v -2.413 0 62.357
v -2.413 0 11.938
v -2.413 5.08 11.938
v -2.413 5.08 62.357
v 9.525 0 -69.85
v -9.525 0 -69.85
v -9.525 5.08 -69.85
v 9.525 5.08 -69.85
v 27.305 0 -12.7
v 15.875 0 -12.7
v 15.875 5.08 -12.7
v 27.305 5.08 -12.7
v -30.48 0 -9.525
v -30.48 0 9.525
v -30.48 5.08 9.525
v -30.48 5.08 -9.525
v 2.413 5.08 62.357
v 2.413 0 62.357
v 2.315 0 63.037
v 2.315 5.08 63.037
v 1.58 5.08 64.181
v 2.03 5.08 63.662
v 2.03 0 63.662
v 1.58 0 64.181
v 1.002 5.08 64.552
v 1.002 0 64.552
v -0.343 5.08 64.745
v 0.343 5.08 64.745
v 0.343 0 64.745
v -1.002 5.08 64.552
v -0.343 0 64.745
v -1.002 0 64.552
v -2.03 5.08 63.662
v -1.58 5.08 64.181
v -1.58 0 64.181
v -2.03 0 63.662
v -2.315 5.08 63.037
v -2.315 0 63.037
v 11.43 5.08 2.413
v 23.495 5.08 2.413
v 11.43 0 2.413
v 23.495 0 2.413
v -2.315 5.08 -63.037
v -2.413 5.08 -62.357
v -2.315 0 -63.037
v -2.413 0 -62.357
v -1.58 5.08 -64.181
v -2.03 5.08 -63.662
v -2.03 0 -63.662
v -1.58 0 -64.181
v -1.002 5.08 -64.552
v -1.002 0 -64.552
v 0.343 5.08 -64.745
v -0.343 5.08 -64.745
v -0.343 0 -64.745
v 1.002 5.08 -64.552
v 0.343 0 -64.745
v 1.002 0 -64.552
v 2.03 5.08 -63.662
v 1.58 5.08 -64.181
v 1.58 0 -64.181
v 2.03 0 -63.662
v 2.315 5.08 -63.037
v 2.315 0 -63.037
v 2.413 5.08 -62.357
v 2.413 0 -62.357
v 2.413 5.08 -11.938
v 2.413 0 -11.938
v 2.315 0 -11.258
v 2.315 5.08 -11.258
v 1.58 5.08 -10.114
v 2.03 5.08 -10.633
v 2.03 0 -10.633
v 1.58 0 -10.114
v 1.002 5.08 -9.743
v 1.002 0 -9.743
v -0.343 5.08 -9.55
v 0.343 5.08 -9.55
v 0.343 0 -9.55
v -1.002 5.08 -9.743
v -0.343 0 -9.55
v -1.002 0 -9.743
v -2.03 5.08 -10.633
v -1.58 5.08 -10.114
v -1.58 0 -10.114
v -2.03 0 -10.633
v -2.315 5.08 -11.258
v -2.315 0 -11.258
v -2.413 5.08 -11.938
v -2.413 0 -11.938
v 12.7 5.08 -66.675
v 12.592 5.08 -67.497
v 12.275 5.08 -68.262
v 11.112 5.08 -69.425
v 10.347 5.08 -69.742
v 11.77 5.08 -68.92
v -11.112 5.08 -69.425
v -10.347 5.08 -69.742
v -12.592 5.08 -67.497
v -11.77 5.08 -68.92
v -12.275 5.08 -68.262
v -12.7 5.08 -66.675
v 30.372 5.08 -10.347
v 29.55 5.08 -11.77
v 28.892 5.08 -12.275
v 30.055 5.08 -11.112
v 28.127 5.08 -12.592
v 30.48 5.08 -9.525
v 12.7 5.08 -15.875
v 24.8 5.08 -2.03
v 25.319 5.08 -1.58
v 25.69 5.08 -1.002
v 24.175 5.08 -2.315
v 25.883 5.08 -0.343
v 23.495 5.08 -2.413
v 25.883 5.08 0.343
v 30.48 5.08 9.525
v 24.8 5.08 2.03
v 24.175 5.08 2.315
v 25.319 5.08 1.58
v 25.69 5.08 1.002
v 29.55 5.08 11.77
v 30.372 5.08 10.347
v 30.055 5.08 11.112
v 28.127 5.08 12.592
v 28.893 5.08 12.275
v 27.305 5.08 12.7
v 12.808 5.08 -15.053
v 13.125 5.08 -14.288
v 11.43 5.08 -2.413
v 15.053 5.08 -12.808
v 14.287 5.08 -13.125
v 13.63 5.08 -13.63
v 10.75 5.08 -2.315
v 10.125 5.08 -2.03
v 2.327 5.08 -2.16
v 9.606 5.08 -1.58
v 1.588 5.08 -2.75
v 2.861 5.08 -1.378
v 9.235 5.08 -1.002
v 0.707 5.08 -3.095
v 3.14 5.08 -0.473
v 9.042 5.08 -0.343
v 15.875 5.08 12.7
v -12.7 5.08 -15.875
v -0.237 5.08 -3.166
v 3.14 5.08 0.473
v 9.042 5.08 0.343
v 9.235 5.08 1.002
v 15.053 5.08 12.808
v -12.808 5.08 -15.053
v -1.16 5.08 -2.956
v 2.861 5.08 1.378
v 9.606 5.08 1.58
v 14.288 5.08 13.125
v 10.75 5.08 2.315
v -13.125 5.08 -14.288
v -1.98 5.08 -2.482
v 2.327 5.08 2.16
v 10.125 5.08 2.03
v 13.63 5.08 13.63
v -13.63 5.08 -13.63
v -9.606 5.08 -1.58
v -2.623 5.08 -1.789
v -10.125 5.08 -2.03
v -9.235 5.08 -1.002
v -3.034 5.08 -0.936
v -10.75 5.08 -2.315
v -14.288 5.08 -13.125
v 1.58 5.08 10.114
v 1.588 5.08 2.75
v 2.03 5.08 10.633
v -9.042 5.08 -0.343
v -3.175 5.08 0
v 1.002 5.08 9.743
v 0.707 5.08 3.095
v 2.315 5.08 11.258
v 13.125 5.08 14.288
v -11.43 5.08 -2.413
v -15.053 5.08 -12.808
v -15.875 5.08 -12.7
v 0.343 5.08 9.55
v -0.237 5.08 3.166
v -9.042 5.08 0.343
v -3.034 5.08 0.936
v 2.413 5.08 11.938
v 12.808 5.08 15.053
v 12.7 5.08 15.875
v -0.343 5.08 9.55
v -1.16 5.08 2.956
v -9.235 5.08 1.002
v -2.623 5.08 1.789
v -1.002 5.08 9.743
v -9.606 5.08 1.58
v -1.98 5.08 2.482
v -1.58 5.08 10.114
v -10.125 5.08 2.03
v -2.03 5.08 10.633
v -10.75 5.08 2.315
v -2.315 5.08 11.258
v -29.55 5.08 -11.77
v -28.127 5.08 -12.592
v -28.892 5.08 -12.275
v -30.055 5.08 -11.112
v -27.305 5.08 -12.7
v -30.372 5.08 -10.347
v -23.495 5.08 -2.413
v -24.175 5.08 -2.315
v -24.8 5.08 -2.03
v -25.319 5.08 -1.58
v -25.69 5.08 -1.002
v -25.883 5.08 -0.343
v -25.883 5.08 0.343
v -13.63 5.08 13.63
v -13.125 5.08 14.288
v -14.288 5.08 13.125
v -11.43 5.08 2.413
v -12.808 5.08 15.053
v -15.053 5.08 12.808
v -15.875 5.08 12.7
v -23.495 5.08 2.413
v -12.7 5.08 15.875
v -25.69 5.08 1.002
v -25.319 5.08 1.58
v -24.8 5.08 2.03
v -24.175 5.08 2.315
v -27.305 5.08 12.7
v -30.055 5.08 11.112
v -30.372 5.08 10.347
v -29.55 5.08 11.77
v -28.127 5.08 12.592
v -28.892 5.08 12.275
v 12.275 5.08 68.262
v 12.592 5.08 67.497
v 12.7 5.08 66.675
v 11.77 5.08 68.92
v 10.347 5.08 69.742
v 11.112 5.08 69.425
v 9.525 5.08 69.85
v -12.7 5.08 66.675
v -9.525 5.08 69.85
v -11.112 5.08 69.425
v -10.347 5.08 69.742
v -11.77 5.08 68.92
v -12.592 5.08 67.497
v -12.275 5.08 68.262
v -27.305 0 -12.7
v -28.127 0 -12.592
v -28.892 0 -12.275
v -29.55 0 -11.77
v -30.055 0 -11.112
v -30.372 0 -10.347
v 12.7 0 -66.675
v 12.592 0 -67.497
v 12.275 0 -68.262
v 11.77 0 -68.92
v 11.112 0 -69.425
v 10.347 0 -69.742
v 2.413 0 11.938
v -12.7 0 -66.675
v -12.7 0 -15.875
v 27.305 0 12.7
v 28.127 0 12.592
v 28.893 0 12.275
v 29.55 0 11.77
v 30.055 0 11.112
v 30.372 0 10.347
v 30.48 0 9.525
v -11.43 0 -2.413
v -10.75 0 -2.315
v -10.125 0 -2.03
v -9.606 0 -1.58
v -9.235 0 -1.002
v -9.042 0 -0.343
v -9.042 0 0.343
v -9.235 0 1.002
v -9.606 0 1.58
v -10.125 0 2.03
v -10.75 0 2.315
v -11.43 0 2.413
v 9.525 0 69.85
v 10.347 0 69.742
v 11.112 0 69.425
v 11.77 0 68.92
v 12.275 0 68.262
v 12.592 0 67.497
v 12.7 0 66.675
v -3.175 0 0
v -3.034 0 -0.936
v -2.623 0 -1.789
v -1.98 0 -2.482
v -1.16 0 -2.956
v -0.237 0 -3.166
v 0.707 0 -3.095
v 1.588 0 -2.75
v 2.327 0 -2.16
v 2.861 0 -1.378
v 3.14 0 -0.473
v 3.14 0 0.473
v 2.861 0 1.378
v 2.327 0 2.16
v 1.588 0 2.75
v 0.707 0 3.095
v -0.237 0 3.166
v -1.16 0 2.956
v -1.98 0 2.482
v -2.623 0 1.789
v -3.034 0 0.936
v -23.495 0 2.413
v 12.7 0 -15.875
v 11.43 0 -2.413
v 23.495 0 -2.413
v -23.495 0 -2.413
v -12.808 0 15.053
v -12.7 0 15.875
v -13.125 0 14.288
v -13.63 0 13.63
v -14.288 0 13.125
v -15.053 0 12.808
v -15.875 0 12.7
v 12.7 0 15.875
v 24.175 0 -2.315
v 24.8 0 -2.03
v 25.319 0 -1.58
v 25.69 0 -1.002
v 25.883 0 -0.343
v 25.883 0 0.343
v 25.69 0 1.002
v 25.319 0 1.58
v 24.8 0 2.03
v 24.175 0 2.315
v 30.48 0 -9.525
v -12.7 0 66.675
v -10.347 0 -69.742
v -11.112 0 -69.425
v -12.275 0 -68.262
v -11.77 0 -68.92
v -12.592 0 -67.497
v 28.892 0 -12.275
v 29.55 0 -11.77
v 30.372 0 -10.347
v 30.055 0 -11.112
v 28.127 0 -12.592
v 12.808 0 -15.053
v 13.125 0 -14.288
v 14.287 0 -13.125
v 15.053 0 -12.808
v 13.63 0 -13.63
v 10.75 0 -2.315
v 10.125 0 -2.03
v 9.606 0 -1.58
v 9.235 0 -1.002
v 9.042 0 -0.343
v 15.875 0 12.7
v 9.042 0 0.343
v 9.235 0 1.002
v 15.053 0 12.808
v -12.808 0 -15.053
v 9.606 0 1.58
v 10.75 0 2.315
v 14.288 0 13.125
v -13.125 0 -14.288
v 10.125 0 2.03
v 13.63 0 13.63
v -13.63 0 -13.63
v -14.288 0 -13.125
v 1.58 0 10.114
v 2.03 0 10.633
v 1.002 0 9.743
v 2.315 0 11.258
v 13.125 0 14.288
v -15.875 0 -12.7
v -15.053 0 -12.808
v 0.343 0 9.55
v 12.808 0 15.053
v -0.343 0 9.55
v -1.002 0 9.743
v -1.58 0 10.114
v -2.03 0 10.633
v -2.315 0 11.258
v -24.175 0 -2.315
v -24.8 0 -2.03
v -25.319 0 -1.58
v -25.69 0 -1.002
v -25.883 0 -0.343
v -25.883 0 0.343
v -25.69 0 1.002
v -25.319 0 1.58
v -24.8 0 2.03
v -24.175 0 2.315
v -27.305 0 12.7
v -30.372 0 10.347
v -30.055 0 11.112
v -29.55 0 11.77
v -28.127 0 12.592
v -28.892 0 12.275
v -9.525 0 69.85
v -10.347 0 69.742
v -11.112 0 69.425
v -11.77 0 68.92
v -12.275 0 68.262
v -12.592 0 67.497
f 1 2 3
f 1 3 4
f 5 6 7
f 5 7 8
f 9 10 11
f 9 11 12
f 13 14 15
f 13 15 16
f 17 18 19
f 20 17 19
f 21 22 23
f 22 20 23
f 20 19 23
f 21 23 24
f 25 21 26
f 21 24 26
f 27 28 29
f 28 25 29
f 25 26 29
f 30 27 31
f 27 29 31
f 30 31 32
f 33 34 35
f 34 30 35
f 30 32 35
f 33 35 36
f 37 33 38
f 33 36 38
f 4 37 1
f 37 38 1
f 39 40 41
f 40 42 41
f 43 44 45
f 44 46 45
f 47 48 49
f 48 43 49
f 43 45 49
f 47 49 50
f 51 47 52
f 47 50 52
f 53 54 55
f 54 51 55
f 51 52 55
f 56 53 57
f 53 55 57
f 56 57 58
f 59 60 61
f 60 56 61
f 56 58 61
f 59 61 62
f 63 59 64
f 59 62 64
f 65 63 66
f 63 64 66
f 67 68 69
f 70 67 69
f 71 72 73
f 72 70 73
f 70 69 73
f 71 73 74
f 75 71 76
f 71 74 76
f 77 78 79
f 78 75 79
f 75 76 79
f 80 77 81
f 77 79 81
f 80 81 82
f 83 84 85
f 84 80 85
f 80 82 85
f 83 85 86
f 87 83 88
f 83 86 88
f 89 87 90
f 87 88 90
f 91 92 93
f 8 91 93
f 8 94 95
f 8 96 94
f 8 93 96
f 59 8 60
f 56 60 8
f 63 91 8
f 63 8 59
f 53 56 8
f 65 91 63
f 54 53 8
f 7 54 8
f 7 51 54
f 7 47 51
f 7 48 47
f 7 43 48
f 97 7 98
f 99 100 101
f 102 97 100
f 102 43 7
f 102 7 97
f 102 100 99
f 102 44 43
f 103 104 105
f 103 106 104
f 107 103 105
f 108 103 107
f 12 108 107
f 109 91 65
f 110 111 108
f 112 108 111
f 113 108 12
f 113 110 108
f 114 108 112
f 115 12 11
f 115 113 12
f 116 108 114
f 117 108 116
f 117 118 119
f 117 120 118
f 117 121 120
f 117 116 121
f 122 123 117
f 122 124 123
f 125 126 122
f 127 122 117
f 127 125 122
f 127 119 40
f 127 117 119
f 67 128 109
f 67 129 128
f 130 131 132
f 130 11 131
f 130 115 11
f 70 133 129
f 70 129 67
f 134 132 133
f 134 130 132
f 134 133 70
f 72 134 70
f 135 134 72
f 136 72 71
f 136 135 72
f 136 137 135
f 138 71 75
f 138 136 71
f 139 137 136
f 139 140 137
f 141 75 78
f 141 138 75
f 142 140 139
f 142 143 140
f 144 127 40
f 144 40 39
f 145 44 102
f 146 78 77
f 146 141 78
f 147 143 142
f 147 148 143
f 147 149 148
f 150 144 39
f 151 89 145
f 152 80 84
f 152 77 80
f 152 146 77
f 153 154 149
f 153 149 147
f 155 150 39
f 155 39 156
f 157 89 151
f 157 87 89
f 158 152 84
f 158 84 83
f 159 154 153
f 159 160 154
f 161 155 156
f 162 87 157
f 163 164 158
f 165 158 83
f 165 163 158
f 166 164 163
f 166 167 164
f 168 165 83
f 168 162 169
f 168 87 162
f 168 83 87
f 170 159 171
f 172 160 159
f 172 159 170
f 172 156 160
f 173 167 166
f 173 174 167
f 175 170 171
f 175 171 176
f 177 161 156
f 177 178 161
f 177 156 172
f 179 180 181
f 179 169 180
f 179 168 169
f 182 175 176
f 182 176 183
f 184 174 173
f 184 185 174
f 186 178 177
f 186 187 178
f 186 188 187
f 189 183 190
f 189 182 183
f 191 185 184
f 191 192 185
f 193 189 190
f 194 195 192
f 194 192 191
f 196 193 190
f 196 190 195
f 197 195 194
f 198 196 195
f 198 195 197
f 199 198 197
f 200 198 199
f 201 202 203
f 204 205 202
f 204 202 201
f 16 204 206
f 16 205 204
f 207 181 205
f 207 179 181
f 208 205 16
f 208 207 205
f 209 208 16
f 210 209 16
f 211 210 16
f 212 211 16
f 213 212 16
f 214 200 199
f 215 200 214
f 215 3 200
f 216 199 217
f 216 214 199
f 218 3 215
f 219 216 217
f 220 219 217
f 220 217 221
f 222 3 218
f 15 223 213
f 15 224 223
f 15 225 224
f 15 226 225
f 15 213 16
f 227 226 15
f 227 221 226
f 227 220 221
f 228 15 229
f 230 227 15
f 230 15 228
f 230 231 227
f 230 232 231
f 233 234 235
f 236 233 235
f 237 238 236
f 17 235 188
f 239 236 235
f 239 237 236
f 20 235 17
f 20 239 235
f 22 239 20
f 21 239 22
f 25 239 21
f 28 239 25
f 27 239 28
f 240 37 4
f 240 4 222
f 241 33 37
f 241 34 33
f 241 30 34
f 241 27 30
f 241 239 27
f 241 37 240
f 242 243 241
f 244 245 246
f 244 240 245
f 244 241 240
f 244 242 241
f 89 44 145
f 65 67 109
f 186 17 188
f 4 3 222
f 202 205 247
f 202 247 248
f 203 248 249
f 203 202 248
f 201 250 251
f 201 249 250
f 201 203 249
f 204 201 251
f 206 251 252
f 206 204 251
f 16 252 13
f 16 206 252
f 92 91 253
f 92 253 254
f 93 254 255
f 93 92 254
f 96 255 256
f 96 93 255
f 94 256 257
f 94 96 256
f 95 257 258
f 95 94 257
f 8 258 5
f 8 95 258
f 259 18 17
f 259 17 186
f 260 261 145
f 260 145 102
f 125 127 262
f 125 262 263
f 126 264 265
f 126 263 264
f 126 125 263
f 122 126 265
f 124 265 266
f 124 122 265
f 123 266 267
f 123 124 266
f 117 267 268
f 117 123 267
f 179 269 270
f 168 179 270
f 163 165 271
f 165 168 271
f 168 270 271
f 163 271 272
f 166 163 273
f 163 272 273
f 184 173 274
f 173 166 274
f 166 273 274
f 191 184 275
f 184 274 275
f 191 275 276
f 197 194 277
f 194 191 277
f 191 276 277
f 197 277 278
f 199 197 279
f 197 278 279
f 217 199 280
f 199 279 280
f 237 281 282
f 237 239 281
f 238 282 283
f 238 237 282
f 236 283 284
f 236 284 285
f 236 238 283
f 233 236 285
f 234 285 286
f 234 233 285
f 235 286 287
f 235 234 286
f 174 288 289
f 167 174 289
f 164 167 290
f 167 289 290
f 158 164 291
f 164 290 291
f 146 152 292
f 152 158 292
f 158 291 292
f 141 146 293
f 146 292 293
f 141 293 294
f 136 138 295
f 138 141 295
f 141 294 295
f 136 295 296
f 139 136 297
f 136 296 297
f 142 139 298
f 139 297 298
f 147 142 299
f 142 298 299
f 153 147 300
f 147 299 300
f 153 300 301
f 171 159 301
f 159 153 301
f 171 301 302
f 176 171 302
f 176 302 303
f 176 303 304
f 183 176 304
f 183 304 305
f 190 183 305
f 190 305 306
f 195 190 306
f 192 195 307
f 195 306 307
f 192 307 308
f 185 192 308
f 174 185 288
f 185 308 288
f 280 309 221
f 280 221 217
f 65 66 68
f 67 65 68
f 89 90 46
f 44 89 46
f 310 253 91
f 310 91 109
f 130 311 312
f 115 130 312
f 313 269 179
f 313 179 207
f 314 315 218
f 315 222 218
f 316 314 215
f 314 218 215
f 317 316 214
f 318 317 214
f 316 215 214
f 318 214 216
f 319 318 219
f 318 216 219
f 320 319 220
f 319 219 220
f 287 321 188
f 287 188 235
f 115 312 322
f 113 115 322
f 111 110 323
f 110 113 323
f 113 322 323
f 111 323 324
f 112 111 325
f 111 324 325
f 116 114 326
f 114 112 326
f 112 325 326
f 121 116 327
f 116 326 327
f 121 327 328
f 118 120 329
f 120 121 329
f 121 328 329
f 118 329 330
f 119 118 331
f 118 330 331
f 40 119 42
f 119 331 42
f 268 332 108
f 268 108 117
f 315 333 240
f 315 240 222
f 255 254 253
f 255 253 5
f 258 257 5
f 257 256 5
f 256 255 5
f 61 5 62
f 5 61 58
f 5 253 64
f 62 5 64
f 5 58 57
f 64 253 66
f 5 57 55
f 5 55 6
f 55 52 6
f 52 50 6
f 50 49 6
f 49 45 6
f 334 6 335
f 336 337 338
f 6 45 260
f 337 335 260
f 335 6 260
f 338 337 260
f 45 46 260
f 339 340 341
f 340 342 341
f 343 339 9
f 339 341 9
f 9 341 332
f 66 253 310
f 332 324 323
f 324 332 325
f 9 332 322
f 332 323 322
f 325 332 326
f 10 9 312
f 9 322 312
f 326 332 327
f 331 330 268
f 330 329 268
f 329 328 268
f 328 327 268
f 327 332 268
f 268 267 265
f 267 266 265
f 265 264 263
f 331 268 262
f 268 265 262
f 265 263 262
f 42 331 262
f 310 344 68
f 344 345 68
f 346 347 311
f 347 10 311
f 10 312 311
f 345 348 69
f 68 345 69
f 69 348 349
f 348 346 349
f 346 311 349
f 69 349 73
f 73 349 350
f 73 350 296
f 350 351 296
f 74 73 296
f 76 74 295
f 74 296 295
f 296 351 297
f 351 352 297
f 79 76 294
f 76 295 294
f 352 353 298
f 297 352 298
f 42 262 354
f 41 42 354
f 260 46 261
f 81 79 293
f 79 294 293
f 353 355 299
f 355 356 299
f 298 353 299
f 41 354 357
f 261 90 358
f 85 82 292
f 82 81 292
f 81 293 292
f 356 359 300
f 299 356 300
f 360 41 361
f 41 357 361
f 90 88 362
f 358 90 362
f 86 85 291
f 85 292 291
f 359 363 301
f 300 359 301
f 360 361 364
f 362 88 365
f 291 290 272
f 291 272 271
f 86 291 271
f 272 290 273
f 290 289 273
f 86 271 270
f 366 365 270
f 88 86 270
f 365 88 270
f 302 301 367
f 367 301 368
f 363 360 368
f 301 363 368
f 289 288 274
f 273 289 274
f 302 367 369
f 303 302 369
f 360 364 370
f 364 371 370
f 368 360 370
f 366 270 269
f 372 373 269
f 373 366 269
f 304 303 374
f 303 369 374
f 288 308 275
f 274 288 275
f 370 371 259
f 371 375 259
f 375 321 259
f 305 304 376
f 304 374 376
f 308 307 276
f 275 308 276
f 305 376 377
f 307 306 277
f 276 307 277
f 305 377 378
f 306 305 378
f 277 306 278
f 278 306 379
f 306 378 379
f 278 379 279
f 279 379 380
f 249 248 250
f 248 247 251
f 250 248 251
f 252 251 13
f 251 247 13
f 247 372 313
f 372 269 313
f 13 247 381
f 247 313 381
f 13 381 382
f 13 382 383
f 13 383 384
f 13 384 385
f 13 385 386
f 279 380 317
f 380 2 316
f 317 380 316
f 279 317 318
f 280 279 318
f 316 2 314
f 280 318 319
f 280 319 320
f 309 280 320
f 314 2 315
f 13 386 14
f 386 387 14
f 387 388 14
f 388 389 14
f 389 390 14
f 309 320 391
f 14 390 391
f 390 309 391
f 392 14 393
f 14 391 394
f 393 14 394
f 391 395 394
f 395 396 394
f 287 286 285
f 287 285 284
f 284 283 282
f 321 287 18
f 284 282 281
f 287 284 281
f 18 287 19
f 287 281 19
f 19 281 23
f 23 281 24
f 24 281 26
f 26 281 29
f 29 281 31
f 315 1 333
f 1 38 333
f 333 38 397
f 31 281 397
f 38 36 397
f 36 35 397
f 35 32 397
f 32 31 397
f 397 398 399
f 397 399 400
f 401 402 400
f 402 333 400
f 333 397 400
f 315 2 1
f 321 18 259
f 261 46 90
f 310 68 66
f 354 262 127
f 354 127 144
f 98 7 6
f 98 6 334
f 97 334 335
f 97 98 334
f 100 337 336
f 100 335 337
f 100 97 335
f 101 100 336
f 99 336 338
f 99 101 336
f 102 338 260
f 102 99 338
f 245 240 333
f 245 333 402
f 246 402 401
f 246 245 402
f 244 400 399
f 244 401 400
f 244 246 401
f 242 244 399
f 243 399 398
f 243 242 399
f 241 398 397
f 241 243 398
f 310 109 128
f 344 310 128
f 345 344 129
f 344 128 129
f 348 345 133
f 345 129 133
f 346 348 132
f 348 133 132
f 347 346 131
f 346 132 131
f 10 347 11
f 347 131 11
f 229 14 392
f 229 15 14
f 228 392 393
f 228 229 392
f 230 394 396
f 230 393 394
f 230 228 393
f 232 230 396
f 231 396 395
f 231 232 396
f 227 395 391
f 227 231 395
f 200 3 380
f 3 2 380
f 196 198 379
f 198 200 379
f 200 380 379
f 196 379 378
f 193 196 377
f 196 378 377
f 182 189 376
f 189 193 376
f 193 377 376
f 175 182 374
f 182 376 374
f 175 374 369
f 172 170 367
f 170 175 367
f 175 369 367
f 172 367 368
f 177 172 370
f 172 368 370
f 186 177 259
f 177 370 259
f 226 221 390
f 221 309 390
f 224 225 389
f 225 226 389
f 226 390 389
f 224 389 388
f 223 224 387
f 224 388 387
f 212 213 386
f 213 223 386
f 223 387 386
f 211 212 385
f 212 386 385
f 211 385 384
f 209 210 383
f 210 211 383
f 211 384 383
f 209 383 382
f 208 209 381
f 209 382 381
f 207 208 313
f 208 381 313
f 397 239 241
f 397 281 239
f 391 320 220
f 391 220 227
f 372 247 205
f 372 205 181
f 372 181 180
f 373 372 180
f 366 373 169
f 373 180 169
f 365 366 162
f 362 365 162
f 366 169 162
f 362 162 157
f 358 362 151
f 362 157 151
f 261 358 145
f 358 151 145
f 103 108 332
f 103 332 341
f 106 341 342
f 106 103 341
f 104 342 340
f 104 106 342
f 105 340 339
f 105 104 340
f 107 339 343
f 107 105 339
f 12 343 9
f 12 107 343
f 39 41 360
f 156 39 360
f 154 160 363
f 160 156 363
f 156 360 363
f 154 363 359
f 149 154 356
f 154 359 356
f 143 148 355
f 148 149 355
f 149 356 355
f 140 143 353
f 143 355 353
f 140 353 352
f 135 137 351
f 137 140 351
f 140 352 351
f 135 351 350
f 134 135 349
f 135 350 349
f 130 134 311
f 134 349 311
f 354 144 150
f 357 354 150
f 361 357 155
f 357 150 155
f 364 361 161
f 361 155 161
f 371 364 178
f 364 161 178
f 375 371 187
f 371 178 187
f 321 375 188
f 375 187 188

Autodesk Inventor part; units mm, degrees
ref_plane "YZ Plane" through (0, 0, 0) normal (1, 0, 0) x (0, 1, 0)
ref_plane "XZ Plane" through (0, 0, 0) normal (0, 1, 0) x (-1, 0, 0)
ref_plane "XY Plane" through (0, 0, 0) normal (0, 0, 1) x (1, 0, 0)
sketch "Sketch1" plane through (0, 0, 0) normal (0, 1, 0) x (-1, 0, 0)
  line L0 (-12.7, 69.85) -> (12.7, 69.85)
  line L1 (12.7, -69.85) -> (-12.7, -69.85)
  line L2 (-12.7, 69.85) -> (12.7, -69.85) construction
  line L3 (12.7, 69.85) -> (-12.7, -69.85) construction
  line L4 (30.48, 12.7) -> (30.48, -12.7)
  line L5 (-30.48, -12.7) -> (-30.48, 12.7)
  line L6 (-30.48, 12.7) -> (30.48, -12.7) construction
  line L7 (30.48, 12.7) -> (-30.48, -12.7) construction
  circle A0 centre (0, 0) radius 3.175
  line L8 (0, 64.77) -> (0, 9.525) construction
  line L9 (-2.413, 62.357) -> (-2.413, 11.938)
  line L10 (2.413, 11.938) -> (2.413, 62.357)
  arc A1 (2.413, 62.357) -> (-2.413, 62.357) centre (0, 62.357) ccw
  arc A2 (-2.413, 11.938) -> (2.413, 11.938) centre (0, 11.938) ccw
  line L11 (25.908, 0) -> (9.017, 0) construction
  line L12 (23.495, 2.413) -> (11.43, 2.413)
  line L13 (11.43, -2.413) -> (23.495, -2.413)
  arc A3 (23.495, -2.413) -> (23.495, 2.413) centre (23.495, 0) ccw
  arc A4 (11.43, 2.413) -> (11.43, -2.413) centre (11.43, 0) ccw
  line L14 (-2.413, -62.357) -> (-2.413, -11.938)
  line L15 (2.413, -11.938) -> (2.413, -62.357)
  arc A5 (-2.413, -62.357) -> (2.413, -62.357) centre (0, -62.357) ccw
  arc A6 (2.413, -11.938) -> (-2.413, -11.938) centre (0, -11.938) ccw
  line L16 (-23.495, 2.413) -> (-11.43, 2.413)
  line L17 (-11.43, -2.413) -> (-23.495, -2.413)
  arc A7 (-23.495, 2.413) -> (-23.495, -2.413) centre (-23.495, 0) ccw
  arc A8 (-11.43, -2.413) -> (-11.43, 2.413) centre (-11.43, 0) ccw
  line L18 (12.7, 12.7) -> (30.48, 12.7)
  line L19 (12.7, 69.85) -> (12.7, 12.7)
  line L20 (12.7, -12.7) -> (12.7, -69.85)
  line L21 (-12.7, -12.7) -> (-30.48, -12.7)
  line L22 (30.48, -12.7) -> (12.7, -12.7)
  line L23 (-30.48, 12.7) -> (-12.7, 12.7)
  line L24 (-12.7, 12.7) -> (-12.7, 69.85)
  line L25 (-12.7, -69.85) -> (-12.7, -12.7)
  point P0 (0, 37.1475)
  point P1 (17.4625, 0)
  dimension "d0" = 25.4
  dimension "d1" = 139.7
  dimension "d2" = 60.96
  dimension "d3" = 25.4
  dimension "d4" = 6.35
  dimension "d5" = 4.826
  dimension "d6" = 4.826
  dimension "d7" = 5.08
  dimension "d8" = 9.525
  dimension "d9" = 4.572
  dimension "d10" = 9.017
extrude "Extrusion1" add sketch "Sketch1" along normal blind 5.08
fillet "Fillet1" radius 3.175 12 edges at (12.7, 2.54, 69.85) (-12.7, 2.54, 69.85) (12.7, 2.54, 12.7) (30.48, 2.54, 12.7) (30.48, 2.54, -12.7) (12.7, 2.54, -12.7) (-12.7, 2.54, -12.7) (-12.7, 2.54, 12.7) (-30.48, 2.54, 12.7) (-30.48, 2.54, -12.7) (-12.7, 2.54, -69.85) (12.7, 2.54, -69.85)
properties part number "inertiabar"
